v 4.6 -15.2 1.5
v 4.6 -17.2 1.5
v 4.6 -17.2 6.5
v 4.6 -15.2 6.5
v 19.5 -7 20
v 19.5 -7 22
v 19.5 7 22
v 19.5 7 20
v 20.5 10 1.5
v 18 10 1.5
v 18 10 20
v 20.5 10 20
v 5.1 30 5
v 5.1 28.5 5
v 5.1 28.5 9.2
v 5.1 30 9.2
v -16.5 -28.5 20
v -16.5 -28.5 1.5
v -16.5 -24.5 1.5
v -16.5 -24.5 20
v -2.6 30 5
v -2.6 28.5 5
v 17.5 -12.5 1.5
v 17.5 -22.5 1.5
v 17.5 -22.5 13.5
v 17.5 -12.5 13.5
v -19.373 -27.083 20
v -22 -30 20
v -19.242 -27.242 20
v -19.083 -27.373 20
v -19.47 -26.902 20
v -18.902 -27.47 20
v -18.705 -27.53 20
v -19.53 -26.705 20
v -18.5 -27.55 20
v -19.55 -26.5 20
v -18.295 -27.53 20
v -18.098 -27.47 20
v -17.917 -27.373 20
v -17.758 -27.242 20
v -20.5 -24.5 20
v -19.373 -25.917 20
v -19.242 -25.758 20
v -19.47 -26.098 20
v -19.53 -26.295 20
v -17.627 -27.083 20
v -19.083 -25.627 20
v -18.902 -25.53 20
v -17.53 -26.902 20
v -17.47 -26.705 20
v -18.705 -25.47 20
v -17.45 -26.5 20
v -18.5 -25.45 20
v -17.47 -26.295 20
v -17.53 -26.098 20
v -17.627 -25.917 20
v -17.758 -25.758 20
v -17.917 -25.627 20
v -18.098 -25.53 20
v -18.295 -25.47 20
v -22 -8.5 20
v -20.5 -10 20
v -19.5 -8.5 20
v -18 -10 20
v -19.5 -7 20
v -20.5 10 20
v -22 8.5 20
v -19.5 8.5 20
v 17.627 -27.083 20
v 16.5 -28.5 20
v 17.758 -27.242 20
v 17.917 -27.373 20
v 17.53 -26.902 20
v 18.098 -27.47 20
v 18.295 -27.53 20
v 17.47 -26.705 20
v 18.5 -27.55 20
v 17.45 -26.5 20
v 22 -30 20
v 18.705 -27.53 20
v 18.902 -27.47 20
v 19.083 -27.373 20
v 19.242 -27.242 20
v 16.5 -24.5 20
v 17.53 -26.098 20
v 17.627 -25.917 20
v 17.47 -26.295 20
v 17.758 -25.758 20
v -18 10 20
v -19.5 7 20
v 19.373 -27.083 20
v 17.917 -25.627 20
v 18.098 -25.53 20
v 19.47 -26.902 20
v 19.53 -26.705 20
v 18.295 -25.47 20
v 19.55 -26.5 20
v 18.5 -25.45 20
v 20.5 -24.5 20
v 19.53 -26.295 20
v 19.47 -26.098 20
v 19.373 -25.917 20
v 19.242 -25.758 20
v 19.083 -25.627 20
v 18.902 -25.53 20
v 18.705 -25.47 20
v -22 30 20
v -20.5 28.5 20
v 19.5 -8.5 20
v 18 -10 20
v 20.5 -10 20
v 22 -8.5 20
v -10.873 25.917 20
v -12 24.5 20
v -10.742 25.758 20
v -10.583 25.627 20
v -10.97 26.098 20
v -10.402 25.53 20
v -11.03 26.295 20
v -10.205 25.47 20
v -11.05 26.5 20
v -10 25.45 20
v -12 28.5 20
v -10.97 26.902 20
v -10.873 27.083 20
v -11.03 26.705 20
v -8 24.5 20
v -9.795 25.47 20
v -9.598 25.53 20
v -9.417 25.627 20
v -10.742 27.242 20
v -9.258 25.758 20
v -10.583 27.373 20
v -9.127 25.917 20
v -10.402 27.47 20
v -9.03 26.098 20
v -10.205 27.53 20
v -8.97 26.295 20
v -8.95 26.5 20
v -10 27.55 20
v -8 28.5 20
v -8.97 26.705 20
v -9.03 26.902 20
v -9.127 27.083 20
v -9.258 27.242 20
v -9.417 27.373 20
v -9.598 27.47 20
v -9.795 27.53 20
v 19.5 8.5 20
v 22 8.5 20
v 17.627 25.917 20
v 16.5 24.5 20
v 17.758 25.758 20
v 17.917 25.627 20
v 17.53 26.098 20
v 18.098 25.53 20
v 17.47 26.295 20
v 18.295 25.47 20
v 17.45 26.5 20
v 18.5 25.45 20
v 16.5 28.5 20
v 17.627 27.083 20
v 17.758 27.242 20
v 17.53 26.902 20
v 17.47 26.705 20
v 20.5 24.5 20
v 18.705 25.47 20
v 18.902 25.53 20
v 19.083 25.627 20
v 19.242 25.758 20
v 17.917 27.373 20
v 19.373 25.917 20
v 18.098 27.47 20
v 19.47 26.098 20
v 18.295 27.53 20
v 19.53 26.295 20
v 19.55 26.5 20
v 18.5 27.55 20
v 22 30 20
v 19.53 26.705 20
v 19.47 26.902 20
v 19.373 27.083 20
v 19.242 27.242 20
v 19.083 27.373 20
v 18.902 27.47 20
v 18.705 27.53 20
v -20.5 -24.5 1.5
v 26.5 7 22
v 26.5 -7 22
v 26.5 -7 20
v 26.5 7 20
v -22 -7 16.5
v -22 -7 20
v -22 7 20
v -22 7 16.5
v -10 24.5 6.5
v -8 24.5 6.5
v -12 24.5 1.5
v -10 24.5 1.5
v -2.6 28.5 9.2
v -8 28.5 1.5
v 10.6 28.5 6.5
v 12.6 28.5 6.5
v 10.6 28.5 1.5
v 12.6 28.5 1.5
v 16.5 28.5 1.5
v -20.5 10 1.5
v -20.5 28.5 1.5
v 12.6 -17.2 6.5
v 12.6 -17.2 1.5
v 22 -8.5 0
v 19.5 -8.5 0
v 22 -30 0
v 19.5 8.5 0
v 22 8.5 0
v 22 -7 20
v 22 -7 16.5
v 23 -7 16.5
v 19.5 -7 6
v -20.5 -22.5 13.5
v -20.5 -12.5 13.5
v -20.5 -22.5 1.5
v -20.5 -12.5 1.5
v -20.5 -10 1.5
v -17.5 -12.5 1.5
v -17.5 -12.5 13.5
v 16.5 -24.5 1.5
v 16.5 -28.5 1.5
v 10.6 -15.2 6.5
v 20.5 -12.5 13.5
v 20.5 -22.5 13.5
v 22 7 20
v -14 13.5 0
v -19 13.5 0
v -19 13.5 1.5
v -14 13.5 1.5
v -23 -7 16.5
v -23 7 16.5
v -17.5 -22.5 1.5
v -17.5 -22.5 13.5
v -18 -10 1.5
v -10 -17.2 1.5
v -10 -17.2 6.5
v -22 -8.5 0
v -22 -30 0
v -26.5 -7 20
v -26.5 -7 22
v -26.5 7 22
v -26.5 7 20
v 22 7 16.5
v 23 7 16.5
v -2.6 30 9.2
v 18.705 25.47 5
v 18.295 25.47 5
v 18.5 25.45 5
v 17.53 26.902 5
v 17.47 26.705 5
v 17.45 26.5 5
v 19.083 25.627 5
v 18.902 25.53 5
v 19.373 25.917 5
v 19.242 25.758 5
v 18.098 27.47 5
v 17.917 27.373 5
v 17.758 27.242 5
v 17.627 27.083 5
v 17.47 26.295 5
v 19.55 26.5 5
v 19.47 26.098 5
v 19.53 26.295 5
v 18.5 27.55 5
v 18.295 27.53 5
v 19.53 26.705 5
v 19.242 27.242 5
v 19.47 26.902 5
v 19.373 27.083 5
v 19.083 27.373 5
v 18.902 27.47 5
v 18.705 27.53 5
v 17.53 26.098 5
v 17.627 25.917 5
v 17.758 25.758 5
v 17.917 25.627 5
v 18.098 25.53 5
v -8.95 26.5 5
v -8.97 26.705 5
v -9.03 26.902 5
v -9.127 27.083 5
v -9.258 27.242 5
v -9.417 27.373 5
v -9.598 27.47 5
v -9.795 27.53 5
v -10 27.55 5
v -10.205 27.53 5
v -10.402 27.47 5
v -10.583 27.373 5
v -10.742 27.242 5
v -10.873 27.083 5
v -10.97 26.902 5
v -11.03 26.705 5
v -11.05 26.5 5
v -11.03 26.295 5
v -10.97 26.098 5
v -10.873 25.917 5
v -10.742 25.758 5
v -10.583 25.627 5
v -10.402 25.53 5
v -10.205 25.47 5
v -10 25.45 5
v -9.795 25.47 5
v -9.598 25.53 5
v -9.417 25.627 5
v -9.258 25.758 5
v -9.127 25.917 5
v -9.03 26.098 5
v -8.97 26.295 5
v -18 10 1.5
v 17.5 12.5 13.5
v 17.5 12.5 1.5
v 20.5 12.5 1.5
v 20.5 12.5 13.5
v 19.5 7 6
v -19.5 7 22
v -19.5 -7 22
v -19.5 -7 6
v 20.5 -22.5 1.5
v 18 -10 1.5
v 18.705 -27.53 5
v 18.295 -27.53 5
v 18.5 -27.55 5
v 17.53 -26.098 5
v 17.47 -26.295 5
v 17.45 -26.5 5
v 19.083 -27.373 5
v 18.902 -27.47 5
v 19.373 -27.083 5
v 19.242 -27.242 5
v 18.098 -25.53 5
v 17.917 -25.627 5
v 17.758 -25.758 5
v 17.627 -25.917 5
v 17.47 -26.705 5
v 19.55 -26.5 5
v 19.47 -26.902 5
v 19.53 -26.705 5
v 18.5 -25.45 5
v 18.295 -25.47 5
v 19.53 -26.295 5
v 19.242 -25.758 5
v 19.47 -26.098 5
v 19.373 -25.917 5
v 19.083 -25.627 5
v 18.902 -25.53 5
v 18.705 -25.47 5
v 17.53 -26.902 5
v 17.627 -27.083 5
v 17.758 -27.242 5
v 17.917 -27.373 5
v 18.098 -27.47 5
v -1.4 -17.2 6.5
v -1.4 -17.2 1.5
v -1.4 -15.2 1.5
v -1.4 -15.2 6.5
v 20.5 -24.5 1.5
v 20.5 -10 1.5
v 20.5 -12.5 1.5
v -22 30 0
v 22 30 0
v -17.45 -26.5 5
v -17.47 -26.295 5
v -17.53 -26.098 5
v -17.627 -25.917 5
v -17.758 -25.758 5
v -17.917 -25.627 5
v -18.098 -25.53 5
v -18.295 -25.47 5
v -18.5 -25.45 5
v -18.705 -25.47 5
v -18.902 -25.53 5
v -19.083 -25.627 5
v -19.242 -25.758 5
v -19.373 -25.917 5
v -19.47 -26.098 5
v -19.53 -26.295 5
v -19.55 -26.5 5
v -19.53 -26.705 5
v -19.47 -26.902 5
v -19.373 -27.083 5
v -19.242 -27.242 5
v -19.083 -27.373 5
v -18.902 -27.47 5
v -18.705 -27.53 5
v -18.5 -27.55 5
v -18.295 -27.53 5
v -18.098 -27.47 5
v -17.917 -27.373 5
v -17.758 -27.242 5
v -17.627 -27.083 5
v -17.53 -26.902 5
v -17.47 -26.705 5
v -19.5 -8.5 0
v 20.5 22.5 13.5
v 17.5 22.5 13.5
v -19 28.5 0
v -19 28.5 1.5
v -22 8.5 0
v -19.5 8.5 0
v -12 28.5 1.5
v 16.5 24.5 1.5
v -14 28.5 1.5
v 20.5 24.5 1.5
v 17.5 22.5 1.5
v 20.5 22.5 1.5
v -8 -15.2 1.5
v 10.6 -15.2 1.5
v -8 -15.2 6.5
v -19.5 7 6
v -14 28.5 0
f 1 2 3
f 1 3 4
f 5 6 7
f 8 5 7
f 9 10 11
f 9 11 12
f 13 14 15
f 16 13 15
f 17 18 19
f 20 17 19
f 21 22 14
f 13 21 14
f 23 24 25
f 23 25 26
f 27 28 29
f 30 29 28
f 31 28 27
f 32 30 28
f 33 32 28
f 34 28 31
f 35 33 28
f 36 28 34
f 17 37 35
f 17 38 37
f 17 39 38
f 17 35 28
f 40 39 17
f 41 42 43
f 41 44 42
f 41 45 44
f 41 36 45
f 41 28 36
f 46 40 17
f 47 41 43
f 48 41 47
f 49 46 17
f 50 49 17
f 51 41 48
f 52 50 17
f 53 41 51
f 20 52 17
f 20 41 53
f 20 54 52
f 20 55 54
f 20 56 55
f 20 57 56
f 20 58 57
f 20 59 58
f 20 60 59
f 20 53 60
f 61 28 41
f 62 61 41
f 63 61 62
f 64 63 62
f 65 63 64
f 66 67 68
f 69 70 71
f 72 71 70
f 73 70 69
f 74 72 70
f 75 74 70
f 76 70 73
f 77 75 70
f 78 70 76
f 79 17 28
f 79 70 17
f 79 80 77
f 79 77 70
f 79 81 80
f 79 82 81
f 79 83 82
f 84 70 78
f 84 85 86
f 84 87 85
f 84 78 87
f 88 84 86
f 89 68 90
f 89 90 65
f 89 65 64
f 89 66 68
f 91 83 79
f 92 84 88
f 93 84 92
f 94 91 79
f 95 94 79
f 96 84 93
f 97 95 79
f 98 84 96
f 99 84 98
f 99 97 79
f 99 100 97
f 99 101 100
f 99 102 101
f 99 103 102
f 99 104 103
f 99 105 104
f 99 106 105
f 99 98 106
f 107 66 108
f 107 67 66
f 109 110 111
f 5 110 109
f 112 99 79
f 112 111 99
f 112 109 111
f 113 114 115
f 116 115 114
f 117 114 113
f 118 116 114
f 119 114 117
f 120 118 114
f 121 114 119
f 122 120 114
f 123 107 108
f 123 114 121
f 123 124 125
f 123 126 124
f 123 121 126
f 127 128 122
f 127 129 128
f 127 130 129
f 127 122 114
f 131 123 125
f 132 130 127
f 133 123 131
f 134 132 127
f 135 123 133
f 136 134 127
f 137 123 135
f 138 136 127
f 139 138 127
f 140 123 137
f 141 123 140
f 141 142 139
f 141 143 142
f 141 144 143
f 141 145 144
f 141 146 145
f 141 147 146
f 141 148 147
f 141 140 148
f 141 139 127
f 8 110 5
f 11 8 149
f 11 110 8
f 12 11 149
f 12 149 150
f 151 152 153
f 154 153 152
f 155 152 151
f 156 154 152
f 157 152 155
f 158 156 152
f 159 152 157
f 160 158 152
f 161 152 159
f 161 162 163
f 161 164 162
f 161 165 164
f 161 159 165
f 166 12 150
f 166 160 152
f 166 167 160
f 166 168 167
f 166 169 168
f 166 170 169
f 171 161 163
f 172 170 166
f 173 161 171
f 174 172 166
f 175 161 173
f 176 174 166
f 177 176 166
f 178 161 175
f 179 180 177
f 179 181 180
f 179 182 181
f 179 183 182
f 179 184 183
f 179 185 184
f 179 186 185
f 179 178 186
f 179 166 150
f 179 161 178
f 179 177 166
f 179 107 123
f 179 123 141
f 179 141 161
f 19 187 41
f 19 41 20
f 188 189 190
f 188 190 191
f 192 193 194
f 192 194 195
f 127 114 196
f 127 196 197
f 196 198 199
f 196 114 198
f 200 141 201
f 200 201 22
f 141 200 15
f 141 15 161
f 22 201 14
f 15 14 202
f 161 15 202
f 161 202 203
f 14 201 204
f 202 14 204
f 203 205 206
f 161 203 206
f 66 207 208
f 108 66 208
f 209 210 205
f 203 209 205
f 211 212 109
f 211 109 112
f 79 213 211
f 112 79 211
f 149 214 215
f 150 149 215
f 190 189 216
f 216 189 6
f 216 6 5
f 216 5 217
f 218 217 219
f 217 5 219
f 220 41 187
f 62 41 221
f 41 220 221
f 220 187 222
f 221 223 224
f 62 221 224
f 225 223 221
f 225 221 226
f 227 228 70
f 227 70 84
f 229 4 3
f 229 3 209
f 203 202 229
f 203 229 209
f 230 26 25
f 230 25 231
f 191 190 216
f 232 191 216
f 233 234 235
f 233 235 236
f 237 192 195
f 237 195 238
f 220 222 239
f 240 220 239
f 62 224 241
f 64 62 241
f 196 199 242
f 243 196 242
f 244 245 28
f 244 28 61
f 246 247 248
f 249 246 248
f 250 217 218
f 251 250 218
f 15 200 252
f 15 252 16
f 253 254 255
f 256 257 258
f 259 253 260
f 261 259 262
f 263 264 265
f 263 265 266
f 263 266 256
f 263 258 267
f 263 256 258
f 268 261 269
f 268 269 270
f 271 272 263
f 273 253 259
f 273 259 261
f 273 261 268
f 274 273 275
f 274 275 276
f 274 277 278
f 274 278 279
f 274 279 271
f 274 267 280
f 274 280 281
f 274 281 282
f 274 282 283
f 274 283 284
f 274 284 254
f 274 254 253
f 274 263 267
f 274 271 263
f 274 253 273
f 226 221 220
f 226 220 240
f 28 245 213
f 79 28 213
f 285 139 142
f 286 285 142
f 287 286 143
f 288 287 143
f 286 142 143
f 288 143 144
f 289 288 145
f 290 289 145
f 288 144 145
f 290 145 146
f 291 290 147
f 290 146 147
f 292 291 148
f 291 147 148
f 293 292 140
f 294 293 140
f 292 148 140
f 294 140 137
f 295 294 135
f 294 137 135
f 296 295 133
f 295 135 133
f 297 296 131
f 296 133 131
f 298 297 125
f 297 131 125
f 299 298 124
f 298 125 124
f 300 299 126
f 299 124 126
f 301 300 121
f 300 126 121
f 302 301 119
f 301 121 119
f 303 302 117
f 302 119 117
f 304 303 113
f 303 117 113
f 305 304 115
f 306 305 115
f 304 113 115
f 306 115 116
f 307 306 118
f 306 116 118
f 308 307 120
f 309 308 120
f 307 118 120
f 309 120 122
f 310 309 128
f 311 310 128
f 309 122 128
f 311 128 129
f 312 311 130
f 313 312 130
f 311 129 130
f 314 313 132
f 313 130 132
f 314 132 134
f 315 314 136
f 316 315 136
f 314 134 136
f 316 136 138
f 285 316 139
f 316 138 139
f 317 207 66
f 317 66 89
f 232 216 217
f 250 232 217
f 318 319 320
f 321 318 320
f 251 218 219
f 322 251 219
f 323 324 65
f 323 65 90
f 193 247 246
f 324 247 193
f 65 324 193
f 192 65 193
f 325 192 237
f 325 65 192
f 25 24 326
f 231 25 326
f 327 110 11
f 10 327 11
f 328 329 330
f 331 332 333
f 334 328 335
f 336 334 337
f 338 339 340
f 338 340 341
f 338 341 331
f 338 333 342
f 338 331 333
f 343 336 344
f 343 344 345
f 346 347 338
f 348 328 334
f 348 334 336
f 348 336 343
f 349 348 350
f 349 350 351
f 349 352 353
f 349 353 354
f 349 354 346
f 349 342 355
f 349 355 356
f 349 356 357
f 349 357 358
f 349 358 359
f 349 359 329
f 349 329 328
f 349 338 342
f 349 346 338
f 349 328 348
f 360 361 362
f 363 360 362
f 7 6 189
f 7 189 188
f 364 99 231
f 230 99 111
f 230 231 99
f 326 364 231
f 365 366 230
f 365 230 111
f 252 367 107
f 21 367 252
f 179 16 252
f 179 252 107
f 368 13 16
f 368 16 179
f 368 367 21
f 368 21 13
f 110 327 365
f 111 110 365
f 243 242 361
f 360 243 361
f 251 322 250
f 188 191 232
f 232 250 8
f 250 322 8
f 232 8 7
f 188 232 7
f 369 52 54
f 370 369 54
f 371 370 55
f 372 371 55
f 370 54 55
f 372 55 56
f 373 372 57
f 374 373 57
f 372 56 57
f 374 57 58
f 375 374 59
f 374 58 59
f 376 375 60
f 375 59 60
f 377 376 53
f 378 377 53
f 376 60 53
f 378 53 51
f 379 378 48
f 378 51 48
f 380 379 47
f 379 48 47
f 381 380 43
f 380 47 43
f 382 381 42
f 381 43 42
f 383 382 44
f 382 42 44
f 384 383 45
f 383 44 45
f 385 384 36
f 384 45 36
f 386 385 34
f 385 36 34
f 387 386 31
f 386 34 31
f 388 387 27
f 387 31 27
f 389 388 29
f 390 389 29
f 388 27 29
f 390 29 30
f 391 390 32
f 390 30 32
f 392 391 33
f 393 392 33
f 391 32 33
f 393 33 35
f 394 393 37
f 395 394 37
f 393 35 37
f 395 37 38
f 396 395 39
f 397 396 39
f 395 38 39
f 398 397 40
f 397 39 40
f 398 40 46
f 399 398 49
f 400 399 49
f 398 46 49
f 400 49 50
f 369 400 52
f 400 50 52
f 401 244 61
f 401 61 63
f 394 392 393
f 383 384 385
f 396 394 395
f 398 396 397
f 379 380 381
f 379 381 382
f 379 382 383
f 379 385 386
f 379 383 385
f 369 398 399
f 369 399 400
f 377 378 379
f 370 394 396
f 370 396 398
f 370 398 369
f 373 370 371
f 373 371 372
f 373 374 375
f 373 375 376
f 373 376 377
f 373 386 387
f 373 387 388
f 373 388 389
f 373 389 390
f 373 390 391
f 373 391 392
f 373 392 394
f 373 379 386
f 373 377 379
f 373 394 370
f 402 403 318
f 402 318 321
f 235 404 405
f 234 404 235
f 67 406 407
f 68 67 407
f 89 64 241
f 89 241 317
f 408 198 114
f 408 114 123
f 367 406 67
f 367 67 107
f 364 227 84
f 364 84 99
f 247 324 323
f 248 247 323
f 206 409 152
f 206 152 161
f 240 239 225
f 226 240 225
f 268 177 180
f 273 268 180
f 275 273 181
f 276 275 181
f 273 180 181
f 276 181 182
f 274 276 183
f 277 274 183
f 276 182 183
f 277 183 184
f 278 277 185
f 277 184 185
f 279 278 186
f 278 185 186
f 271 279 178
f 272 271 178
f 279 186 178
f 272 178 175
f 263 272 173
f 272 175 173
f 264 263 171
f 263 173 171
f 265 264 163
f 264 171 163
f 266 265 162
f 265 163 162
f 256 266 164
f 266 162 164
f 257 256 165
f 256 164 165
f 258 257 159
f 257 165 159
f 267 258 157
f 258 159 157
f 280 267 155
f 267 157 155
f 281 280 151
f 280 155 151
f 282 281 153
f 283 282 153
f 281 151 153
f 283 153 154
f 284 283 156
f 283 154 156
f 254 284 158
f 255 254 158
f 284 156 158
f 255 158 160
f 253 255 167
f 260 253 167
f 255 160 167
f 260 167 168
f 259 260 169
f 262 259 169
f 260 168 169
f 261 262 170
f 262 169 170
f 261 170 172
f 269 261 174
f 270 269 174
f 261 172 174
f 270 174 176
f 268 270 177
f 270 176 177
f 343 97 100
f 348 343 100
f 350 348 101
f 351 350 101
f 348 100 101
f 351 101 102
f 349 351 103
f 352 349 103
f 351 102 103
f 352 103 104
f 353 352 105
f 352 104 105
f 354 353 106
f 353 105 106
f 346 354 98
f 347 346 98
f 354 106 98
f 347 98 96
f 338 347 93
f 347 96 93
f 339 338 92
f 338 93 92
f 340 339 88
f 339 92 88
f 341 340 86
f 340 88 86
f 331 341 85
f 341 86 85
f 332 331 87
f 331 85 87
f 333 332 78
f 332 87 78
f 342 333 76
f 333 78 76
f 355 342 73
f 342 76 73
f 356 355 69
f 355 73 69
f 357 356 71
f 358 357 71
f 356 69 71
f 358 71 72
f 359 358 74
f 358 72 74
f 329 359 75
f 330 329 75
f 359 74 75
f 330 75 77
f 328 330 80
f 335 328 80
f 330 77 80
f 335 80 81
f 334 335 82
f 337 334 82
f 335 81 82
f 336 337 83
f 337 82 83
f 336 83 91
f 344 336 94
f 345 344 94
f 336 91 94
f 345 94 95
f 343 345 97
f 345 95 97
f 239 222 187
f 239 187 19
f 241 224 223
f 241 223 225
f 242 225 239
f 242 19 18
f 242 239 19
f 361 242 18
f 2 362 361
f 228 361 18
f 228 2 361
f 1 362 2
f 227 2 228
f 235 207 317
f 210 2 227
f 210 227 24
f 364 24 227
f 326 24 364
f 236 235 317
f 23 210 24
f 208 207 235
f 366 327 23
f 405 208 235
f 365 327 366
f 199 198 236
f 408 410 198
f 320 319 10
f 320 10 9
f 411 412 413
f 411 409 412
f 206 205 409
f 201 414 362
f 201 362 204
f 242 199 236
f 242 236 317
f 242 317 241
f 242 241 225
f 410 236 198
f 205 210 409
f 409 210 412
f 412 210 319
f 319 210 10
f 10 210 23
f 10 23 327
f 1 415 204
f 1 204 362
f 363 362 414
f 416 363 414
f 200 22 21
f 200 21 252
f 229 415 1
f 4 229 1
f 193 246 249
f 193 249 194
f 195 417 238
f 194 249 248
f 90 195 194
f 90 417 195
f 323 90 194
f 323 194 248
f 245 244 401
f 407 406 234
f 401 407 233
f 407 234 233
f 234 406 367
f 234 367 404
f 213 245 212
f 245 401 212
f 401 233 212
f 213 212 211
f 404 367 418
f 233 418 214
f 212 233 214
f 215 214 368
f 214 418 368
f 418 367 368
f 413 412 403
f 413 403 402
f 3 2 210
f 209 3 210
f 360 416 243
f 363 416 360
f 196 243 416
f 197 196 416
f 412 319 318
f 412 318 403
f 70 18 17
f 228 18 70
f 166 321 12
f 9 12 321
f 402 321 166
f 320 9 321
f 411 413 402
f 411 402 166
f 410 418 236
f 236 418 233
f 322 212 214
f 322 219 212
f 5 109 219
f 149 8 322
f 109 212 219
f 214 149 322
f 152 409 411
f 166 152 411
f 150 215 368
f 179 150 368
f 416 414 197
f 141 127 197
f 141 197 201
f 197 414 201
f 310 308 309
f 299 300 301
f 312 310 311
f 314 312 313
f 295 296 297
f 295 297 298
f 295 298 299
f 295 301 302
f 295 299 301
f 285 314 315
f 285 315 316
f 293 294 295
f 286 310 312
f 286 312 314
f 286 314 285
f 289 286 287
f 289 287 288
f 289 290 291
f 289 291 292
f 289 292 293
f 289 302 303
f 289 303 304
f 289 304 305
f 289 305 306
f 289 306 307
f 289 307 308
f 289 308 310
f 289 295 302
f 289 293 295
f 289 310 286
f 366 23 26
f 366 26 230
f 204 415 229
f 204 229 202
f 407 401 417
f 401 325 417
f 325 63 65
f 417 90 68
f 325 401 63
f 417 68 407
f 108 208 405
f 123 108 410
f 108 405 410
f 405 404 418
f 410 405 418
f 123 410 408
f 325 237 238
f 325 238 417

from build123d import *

# Parameters (mm, degrees)
F0_W      = 44
F0_H      = 60
F1_DEPTH  = 20
F2_W      = 2.5
F2_H      = 17
F3_DEPTH  = 20
F4_T      = -1.5
F5_W      = 5
F5_H      = 15
F6_DEPTH  = 2
F7_W      = 14
F7_H      = 2
F7_H_2    = 14
F8_DEPTH  = 7
F10_DEPTH = 14
F11_W     = 4
F11_H     = 4
F12_DEPTH = 18.5
F13_R     = 1.05
F14_DEPTH = 15
F15_W     = 7.7
F15_H     = 4.2
F16_DEPTH = 1.5
F17_W     = 2
F17_H     = 43.7
F17_H_2   = 39.7
F18_DEPTH = 5
F19_W     = 3
F19_H     = 10
F20_DEPTH = 12
F21_W     = 6
F21_H     = 2
F22_DEPTH = 10


# Not quite as in the source:
# - a pattern or mirror of a feature is missing from the dataset's text; its kind, count and spacing are read off the source's solid


with BuildPart() as f1:
    # F0 (on Top) → F1 (new body)
    with BuildSketch(Plane.XY):
        Rectangle(F0_W, F0_H)
    extrude(amount=F1_DEPTH)

    # F2 (on face) → F3 (cut)
    with BuildSketch(Plane.XY.offset(20)):
        with Locations((20.75, 0)):
            Rectangle(F2_W, F2_H)
        with Locations((-20.75, 0)):
            Rectangle(F2_W, F2_H)
    extrude(amount=-F3_DEPTH, mode=Mode.SUBTRACT)

    # F4
    f4_openings = [f1.faces().sort_by_distance(p)[0] for p in [
        (0, 0, 20),
    ]]
    offset(amount=F4_T, openings=f4_openings, kind=Kind.INTERSECTION)

    # F5 (on face) → F6 (cut)
    with BuildSketch(Plane(origin=(0, 0, 0), x_dir=(1, 0, 0), z_dir=(0, 0, -1))):
        with Locations((-16.5, -21)):
            Rectangle(F5_W, F5_H)
    extrude(amount=-F6_DEPTH, mode=Mode.SUBTRACT)

    # F7 (on face) → F8 (join)
    with BuildSketch(Plane.YZ.offset(19.5)):
        with Locations((0, 21)):
            Rectangle(F7_W, F7_H)
        with Locations((0, 13)):
            Rectangle(F7_W, F7_H_2)
    f8 = extrude(amount=F8_DEPTH)

    # F8_copies: F8 across plane
    add(f8.mirror(Plane(origin=(0, 0, 0), x_dir=(0, 0, -1), z_dir=(-1, 0, 0))))

    # F9 (on face) → F10 (cut)
    with BuildSketch(Plane.XZ.offset(7)):
        Polygon((23, 16.5), (19.5, 6), (26.5, 6), (26.5, 20), (22, 20), (22, 16.5), align=None)
    f10 = extrude(amount=-F10_DEPTH, mode=Mode.SUBTRACT)

    # F10_copies: F10 across plane
    add(f10.mirror(Plane(origin=(0, 0, 0), x_dir=(0, 0, -1), z_dir=(-1, 0, 0))), mode=Mode.SUBTRACT)

    # F11 (on face) → F12 (join, through all)
    with BuildSketch(Plane.XY.offset(1.5)):
        with Locations((18.5, 26.5)):
            Rectangle(F11_W, F11_H)
        with Locations((18.5, -26.5)):
            Rectangle(F11_W, F11_H)
        with Locations((-18.5, -26.5)):
            Rectangle(F11_W, F11_H)
        with Locations((-10, 26.5)):
            Rectangle(F11_W, F11_H)
    extrude(amount=F12_DEPTH)

    # F13 (on face) → F14 (cut)
    with BuildSketch(Plane.XY.offset(20)):
        with Locations((-10, 26.5)):
            Circle(F13_R)
        with Locations((18.5, 26.5)):
            Circle(F13_R)
        with Locations((18.5, -26.5)):
            Circle(F13_R)
        with Locations((-18.5, -26.5)):
            Circle(F13_R)
    extrude(amount=-F14_DEPTH, mode=Mode.SUBTRACT)

    # F15 (on face) → F16 (cut, through all)
    with BuildSketch(Plane.XZ.offset(-28.5)):
        with Locations((1.25, 7.1)):
            Rectangle(F15_W, F15_H)
    extrude(amount=-F16_DEPTH, mode=Mode.SUBTRACT)

    # F17 (on face) → F18 (join)
    with BuildSketch(Plane.XY.offset(1.5)):
        with Locations((11.6, 6.65)):
            Rectangle(F17_W, F17_H)
        Polygon((12.6, -15.2), (10.6, -15.2), (-8, -15.2), (-10, -15.2), (-10, -17.2), (12.6, -17.2), align=None)
        with Locations((-9, 4.65)):
            Rectangle(F17_W, F17_H_2)
    extrude(amount=F18_DEPTH)

    # F19 (on face) → F20 (join)
    with BuildSketch(Plane.XY.offset(1.5)):
        with Locations((19, 17.5)):
            Rectangle(F19_W, F19_H)
        with Locations((19, -17.5)):
            Rectangle(F19_W, F19_H)
        with Locations((-19, -17.5)):
            Rectangle(F19_W, F19_H)
    extrude(amount=F20_DEPTH)

    # F21 (on face) → F22 (cut)
    with BuildSketch(Plane.XY.offset(1.5)):
        with Locations((1.6, -16.2)):
            Rectangle(F21_W, F21_H)
    extrude(amount=F22_DEPTH, mode=Mode.SUBTRACT)


solid = f1.part
